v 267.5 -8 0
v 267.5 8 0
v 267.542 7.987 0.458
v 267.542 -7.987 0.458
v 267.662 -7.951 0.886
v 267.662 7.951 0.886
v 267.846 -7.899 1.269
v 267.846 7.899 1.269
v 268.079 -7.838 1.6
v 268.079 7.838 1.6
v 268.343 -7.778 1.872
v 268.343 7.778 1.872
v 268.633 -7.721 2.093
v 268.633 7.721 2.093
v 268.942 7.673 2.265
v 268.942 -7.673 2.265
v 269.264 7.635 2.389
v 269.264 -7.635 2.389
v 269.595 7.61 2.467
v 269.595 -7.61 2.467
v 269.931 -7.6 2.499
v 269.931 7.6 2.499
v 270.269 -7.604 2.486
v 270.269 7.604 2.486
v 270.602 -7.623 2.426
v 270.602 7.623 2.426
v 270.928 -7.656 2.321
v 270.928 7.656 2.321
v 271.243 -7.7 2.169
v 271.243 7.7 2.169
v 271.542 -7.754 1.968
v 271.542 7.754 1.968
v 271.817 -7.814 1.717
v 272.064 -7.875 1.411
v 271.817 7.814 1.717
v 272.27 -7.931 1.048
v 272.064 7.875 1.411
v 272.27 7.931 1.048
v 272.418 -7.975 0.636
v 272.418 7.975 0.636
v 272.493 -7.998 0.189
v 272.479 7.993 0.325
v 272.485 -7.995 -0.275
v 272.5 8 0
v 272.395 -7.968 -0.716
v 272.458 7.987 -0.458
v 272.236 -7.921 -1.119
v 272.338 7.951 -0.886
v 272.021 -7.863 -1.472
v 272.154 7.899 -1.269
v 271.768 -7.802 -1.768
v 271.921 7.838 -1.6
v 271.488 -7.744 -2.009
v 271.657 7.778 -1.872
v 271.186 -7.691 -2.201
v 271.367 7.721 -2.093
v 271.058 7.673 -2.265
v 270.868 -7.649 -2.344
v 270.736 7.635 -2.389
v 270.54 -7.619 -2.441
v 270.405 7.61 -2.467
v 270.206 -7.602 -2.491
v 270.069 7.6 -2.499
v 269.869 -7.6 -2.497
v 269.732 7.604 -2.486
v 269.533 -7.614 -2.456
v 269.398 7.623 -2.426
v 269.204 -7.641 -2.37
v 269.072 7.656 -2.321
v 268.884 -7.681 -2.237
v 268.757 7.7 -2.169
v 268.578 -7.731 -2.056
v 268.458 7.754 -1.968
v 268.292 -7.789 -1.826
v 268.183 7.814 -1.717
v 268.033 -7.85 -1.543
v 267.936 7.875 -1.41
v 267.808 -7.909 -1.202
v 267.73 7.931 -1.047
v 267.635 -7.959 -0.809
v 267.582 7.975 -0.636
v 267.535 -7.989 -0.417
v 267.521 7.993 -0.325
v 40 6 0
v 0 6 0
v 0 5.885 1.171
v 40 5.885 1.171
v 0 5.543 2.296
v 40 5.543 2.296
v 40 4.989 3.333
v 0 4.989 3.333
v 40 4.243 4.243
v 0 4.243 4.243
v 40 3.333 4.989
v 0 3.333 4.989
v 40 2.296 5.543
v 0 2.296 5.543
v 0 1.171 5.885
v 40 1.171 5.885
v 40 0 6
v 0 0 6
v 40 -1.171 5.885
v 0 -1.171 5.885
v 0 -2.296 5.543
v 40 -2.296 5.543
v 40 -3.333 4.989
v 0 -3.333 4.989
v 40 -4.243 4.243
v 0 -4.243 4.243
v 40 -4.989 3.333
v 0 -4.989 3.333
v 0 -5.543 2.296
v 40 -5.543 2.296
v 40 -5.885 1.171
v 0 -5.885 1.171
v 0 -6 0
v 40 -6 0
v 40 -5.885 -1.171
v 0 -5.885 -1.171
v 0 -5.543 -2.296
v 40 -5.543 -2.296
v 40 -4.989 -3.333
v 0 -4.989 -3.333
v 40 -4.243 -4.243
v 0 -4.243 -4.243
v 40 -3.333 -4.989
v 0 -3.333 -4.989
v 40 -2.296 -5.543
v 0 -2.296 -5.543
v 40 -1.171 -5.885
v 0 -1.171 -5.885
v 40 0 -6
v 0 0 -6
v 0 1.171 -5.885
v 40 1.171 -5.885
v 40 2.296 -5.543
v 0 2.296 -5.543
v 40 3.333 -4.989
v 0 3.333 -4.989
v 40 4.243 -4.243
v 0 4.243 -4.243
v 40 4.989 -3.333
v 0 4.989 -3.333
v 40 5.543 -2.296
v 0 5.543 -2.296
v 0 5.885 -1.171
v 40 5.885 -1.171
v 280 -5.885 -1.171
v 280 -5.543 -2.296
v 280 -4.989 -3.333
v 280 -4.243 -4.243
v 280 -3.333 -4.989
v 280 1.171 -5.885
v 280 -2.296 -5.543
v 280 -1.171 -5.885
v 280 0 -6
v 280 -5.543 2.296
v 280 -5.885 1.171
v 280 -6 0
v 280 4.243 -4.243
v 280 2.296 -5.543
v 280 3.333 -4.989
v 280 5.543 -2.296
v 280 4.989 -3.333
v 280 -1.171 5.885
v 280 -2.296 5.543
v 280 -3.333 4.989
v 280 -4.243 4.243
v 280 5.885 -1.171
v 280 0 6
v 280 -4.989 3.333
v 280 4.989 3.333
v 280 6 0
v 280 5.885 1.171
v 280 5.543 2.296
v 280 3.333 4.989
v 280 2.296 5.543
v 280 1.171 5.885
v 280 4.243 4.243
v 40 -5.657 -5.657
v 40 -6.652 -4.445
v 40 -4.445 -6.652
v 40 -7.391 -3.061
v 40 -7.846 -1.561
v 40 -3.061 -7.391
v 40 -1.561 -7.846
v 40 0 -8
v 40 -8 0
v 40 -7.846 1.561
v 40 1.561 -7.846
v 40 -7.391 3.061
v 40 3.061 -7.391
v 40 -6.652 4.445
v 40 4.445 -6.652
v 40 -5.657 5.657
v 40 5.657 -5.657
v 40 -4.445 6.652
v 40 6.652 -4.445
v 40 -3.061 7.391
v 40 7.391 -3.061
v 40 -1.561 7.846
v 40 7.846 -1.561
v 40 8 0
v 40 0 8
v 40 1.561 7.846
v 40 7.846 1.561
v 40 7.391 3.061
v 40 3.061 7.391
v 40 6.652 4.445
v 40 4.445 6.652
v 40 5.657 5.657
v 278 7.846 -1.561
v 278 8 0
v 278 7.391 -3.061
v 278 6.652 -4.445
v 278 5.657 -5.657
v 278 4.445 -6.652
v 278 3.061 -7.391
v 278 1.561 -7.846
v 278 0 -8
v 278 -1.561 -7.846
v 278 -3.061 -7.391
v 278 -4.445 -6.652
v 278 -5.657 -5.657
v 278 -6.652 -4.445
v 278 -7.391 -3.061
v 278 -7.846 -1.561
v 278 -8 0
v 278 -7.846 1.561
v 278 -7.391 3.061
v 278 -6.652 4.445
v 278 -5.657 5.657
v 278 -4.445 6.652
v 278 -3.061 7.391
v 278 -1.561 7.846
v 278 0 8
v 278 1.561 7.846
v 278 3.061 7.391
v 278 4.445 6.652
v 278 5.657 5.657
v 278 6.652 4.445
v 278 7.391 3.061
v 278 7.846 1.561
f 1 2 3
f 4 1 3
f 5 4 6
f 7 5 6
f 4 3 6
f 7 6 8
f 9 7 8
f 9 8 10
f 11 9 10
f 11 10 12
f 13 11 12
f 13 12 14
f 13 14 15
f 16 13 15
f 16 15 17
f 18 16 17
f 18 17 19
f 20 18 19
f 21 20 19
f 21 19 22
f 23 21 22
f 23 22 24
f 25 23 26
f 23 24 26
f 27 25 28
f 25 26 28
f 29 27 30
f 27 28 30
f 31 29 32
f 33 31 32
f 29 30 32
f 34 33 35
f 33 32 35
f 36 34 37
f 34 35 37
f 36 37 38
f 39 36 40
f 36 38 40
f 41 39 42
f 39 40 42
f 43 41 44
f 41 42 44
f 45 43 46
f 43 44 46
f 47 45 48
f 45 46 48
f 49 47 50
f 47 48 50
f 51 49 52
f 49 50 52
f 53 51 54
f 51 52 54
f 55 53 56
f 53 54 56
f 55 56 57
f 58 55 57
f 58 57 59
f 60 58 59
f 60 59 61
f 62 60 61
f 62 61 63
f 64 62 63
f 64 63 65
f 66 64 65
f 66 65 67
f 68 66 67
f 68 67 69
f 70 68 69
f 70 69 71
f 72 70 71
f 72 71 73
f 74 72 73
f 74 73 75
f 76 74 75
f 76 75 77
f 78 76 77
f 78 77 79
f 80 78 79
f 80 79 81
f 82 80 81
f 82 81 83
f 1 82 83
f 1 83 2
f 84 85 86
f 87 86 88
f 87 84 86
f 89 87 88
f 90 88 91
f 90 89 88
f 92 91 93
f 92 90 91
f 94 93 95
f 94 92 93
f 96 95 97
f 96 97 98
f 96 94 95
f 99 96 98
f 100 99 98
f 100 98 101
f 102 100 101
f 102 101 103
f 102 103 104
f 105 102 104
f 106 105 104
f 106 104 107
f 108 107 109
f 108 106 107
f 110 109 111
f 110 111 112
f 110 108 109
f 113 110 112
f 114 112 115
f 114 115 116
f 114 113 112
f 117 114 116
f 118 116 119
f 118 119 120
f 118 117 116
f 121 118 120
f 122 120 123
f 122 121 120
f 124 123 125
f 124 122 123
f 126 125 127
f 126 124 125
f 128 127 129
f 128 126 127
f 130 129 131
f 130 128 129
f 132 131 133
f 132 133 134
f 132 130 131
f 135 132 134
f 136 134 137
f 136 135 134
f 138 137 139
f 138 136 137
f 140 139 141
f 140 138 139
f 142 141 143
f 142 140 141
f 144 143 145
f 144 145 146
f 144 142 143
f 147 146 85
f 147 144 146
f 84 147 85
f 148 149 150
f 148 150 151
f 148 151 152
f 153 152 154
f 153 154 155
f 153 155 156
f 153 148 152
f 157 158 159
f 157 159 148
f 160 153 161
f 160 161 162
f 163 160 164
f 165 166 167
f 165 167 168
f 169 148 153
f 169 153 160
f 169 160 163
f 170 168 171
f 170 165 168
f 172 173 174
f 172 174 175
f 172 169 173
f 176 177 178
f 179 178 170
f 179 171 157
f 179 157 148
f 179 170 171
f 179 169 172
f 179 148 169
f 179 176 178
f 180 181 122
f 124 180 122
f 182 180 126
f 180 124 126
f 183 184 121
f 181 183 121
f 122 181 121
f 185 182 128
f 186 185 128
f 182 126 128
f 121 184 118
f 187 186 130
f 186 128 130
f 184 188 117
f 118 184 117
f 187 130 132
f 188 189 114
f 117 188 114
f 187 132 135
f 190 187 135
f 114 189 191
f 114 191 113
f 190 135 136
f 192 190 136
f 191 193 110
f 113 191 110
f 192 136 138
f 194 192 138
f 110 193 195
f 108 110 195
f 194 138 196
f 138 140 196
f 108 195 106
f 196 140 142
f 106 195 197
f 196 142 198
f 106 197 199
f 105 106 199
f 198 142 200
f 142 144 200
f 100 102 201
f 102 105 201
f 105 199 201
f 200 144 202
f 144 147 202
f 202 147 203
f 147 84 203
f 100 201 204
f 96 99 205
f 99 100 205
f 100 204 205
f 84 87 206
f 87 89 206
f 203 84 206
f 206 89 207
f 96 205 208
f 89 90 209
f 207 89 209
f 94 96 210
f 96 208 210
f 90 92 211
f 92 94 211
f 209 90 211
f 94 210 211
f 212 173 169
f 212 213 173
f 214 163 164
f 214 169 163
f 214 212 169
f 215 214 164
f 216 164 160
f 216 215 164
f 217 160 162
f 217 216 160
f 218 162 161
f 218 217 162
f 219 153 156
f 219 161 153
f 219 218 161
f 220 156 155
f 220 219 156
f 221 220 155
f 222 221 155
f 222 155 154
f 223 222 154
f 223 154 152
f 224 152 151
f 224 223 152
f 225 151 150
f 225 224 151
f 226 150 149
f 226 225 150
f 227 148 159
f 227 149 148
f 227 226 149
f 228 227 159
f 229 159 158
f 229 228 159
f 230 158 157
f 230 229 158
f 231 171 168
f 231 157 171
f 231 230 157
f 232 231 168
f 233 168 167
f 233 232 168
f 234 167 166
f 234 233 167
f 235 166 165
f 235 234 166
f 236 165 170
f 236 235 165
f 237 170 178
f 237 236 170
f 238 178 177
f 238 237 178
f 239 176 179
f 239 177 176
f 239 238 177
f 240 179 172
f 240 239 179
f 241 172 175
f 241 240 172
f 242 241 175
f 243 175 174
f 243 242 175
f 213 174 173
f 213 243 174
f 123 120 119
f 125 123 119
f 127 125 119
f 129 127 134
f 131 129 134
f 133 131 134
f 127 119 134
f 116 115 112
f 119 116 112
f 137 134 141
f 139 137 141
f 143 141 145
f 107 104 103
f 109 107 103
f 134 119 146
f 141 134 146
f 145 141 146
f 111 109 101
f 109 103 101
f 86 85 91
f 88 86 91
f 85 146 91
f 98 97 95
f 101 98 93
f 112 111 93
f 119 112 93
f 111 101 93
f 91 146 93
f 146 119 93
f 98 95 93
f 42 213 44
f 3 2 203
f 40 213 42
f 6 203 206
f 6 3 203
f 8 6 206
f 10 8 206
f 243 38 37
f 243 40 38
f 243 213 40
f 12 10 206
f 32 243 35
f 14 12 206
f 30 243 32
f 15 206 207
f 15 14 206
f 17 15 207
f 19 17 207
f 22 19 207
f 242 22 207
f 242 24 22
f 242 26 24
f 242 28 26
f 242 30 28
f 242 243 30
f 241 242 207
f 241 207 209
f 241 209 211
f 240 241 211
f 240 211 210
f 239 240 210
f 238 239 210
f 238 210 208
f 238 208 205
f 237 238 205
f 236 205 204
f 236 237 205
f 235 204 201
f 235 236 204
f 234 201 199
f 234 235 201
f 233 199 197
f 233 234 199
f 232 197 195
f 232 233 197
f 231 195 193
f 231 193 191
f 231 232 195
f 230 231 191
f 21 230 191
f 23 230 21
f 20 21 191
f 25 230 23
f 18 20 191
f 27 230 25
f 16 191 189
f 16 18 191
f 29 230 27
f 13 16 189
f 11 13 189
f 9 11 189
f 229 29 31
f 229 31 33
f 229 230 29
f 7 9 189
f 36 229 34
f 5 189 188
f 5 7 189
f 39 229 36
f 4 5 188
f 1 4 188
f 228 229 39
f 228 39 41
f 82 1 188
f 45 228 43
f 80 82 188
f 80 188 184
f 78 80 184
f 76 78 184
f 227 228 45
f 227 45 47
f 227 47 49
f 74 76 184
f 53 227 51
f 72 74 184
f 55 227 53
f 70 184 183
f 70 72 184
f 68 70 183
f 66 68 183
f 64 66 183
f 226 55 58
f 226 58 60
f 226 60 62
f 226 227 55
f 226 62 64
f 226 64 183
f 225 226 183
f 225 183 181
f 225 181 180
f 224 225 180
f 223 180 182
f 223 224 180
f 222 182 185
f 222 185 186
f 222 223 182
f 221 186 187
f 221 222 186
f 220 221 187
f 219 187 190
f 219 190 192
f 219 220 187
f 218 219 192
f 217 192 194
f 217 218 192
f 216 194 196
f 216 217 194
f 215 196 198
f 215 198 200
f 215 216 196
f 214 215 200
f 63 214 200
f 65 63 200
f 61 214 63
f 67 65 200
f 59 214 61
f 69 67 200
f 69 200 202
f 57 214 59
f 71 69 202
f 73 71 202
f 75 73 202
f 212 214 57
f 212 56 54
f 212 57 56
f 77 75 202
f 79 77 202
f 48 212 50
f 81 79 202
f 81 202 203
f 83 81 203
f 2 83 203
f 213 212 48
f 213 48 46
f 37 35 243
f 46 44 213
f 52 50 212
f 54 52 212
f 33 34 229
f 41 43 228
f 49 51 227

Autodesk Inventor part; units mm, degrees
ref_plane "YZ Plane" through (0, 0, 0) normal (1, 0, 0) x (0, 1, 0)
ref_plane "XY Plane" through (0, 0, 0) normal (0, 0, 1) x (1, 0, 0)
sketch "Sketch1" plane through (0, 0, 0) normal (0, 0, 1) x (1, 0, 0)
  line L0 (0, 0) -> (280, 0)
  line L1 (280, 0) -> (280, 6)
  line L2 (0, 0) -> (0, 6)
  line L3 (0, 6) -> (40, 6)
  line L4 (40, 6) -> (40, 8)
  line L5 (40, 8) -> (278, 8)
  line L6 (278, 8) -> (280, 6)
  point P0 (280, 8)
  dimension "d0" = 280
  dimension "d1" = 8
  dimension "d2" = 6
  dimension "d3" = 40
  dimension "d4" = 2
  dimension "d5" = 2
  dimension "d6" = 45
revolve "Revolution1" add sketch "Sketch1" angle 360 about axis through (0, 0, 0) along (1, 0, 0)
thread "Thread1" size "M12x1.75" class "6g" standard "ANSI Metric M Profile" length 20
ref_plane "Work Plane1" through (0, 8, 0) normal (0, 1, 0) x (-1, 0, 0)
sketch "Sketch2" plane through (0, 8, 0) normal (0, 1, 0) x (-1, 0, 0)
  circle A0 centre (-270, 0) radius 2.5
  line L0 (-280, 6) -> (-280, -6) projected
  point P0 (0, 0)
  dimension "d12" = 5
  dimension "d13" = 10
  dimension "d14" = 270
extrude "Extrusion1" cut sketch "Sketch2" against normal through all
